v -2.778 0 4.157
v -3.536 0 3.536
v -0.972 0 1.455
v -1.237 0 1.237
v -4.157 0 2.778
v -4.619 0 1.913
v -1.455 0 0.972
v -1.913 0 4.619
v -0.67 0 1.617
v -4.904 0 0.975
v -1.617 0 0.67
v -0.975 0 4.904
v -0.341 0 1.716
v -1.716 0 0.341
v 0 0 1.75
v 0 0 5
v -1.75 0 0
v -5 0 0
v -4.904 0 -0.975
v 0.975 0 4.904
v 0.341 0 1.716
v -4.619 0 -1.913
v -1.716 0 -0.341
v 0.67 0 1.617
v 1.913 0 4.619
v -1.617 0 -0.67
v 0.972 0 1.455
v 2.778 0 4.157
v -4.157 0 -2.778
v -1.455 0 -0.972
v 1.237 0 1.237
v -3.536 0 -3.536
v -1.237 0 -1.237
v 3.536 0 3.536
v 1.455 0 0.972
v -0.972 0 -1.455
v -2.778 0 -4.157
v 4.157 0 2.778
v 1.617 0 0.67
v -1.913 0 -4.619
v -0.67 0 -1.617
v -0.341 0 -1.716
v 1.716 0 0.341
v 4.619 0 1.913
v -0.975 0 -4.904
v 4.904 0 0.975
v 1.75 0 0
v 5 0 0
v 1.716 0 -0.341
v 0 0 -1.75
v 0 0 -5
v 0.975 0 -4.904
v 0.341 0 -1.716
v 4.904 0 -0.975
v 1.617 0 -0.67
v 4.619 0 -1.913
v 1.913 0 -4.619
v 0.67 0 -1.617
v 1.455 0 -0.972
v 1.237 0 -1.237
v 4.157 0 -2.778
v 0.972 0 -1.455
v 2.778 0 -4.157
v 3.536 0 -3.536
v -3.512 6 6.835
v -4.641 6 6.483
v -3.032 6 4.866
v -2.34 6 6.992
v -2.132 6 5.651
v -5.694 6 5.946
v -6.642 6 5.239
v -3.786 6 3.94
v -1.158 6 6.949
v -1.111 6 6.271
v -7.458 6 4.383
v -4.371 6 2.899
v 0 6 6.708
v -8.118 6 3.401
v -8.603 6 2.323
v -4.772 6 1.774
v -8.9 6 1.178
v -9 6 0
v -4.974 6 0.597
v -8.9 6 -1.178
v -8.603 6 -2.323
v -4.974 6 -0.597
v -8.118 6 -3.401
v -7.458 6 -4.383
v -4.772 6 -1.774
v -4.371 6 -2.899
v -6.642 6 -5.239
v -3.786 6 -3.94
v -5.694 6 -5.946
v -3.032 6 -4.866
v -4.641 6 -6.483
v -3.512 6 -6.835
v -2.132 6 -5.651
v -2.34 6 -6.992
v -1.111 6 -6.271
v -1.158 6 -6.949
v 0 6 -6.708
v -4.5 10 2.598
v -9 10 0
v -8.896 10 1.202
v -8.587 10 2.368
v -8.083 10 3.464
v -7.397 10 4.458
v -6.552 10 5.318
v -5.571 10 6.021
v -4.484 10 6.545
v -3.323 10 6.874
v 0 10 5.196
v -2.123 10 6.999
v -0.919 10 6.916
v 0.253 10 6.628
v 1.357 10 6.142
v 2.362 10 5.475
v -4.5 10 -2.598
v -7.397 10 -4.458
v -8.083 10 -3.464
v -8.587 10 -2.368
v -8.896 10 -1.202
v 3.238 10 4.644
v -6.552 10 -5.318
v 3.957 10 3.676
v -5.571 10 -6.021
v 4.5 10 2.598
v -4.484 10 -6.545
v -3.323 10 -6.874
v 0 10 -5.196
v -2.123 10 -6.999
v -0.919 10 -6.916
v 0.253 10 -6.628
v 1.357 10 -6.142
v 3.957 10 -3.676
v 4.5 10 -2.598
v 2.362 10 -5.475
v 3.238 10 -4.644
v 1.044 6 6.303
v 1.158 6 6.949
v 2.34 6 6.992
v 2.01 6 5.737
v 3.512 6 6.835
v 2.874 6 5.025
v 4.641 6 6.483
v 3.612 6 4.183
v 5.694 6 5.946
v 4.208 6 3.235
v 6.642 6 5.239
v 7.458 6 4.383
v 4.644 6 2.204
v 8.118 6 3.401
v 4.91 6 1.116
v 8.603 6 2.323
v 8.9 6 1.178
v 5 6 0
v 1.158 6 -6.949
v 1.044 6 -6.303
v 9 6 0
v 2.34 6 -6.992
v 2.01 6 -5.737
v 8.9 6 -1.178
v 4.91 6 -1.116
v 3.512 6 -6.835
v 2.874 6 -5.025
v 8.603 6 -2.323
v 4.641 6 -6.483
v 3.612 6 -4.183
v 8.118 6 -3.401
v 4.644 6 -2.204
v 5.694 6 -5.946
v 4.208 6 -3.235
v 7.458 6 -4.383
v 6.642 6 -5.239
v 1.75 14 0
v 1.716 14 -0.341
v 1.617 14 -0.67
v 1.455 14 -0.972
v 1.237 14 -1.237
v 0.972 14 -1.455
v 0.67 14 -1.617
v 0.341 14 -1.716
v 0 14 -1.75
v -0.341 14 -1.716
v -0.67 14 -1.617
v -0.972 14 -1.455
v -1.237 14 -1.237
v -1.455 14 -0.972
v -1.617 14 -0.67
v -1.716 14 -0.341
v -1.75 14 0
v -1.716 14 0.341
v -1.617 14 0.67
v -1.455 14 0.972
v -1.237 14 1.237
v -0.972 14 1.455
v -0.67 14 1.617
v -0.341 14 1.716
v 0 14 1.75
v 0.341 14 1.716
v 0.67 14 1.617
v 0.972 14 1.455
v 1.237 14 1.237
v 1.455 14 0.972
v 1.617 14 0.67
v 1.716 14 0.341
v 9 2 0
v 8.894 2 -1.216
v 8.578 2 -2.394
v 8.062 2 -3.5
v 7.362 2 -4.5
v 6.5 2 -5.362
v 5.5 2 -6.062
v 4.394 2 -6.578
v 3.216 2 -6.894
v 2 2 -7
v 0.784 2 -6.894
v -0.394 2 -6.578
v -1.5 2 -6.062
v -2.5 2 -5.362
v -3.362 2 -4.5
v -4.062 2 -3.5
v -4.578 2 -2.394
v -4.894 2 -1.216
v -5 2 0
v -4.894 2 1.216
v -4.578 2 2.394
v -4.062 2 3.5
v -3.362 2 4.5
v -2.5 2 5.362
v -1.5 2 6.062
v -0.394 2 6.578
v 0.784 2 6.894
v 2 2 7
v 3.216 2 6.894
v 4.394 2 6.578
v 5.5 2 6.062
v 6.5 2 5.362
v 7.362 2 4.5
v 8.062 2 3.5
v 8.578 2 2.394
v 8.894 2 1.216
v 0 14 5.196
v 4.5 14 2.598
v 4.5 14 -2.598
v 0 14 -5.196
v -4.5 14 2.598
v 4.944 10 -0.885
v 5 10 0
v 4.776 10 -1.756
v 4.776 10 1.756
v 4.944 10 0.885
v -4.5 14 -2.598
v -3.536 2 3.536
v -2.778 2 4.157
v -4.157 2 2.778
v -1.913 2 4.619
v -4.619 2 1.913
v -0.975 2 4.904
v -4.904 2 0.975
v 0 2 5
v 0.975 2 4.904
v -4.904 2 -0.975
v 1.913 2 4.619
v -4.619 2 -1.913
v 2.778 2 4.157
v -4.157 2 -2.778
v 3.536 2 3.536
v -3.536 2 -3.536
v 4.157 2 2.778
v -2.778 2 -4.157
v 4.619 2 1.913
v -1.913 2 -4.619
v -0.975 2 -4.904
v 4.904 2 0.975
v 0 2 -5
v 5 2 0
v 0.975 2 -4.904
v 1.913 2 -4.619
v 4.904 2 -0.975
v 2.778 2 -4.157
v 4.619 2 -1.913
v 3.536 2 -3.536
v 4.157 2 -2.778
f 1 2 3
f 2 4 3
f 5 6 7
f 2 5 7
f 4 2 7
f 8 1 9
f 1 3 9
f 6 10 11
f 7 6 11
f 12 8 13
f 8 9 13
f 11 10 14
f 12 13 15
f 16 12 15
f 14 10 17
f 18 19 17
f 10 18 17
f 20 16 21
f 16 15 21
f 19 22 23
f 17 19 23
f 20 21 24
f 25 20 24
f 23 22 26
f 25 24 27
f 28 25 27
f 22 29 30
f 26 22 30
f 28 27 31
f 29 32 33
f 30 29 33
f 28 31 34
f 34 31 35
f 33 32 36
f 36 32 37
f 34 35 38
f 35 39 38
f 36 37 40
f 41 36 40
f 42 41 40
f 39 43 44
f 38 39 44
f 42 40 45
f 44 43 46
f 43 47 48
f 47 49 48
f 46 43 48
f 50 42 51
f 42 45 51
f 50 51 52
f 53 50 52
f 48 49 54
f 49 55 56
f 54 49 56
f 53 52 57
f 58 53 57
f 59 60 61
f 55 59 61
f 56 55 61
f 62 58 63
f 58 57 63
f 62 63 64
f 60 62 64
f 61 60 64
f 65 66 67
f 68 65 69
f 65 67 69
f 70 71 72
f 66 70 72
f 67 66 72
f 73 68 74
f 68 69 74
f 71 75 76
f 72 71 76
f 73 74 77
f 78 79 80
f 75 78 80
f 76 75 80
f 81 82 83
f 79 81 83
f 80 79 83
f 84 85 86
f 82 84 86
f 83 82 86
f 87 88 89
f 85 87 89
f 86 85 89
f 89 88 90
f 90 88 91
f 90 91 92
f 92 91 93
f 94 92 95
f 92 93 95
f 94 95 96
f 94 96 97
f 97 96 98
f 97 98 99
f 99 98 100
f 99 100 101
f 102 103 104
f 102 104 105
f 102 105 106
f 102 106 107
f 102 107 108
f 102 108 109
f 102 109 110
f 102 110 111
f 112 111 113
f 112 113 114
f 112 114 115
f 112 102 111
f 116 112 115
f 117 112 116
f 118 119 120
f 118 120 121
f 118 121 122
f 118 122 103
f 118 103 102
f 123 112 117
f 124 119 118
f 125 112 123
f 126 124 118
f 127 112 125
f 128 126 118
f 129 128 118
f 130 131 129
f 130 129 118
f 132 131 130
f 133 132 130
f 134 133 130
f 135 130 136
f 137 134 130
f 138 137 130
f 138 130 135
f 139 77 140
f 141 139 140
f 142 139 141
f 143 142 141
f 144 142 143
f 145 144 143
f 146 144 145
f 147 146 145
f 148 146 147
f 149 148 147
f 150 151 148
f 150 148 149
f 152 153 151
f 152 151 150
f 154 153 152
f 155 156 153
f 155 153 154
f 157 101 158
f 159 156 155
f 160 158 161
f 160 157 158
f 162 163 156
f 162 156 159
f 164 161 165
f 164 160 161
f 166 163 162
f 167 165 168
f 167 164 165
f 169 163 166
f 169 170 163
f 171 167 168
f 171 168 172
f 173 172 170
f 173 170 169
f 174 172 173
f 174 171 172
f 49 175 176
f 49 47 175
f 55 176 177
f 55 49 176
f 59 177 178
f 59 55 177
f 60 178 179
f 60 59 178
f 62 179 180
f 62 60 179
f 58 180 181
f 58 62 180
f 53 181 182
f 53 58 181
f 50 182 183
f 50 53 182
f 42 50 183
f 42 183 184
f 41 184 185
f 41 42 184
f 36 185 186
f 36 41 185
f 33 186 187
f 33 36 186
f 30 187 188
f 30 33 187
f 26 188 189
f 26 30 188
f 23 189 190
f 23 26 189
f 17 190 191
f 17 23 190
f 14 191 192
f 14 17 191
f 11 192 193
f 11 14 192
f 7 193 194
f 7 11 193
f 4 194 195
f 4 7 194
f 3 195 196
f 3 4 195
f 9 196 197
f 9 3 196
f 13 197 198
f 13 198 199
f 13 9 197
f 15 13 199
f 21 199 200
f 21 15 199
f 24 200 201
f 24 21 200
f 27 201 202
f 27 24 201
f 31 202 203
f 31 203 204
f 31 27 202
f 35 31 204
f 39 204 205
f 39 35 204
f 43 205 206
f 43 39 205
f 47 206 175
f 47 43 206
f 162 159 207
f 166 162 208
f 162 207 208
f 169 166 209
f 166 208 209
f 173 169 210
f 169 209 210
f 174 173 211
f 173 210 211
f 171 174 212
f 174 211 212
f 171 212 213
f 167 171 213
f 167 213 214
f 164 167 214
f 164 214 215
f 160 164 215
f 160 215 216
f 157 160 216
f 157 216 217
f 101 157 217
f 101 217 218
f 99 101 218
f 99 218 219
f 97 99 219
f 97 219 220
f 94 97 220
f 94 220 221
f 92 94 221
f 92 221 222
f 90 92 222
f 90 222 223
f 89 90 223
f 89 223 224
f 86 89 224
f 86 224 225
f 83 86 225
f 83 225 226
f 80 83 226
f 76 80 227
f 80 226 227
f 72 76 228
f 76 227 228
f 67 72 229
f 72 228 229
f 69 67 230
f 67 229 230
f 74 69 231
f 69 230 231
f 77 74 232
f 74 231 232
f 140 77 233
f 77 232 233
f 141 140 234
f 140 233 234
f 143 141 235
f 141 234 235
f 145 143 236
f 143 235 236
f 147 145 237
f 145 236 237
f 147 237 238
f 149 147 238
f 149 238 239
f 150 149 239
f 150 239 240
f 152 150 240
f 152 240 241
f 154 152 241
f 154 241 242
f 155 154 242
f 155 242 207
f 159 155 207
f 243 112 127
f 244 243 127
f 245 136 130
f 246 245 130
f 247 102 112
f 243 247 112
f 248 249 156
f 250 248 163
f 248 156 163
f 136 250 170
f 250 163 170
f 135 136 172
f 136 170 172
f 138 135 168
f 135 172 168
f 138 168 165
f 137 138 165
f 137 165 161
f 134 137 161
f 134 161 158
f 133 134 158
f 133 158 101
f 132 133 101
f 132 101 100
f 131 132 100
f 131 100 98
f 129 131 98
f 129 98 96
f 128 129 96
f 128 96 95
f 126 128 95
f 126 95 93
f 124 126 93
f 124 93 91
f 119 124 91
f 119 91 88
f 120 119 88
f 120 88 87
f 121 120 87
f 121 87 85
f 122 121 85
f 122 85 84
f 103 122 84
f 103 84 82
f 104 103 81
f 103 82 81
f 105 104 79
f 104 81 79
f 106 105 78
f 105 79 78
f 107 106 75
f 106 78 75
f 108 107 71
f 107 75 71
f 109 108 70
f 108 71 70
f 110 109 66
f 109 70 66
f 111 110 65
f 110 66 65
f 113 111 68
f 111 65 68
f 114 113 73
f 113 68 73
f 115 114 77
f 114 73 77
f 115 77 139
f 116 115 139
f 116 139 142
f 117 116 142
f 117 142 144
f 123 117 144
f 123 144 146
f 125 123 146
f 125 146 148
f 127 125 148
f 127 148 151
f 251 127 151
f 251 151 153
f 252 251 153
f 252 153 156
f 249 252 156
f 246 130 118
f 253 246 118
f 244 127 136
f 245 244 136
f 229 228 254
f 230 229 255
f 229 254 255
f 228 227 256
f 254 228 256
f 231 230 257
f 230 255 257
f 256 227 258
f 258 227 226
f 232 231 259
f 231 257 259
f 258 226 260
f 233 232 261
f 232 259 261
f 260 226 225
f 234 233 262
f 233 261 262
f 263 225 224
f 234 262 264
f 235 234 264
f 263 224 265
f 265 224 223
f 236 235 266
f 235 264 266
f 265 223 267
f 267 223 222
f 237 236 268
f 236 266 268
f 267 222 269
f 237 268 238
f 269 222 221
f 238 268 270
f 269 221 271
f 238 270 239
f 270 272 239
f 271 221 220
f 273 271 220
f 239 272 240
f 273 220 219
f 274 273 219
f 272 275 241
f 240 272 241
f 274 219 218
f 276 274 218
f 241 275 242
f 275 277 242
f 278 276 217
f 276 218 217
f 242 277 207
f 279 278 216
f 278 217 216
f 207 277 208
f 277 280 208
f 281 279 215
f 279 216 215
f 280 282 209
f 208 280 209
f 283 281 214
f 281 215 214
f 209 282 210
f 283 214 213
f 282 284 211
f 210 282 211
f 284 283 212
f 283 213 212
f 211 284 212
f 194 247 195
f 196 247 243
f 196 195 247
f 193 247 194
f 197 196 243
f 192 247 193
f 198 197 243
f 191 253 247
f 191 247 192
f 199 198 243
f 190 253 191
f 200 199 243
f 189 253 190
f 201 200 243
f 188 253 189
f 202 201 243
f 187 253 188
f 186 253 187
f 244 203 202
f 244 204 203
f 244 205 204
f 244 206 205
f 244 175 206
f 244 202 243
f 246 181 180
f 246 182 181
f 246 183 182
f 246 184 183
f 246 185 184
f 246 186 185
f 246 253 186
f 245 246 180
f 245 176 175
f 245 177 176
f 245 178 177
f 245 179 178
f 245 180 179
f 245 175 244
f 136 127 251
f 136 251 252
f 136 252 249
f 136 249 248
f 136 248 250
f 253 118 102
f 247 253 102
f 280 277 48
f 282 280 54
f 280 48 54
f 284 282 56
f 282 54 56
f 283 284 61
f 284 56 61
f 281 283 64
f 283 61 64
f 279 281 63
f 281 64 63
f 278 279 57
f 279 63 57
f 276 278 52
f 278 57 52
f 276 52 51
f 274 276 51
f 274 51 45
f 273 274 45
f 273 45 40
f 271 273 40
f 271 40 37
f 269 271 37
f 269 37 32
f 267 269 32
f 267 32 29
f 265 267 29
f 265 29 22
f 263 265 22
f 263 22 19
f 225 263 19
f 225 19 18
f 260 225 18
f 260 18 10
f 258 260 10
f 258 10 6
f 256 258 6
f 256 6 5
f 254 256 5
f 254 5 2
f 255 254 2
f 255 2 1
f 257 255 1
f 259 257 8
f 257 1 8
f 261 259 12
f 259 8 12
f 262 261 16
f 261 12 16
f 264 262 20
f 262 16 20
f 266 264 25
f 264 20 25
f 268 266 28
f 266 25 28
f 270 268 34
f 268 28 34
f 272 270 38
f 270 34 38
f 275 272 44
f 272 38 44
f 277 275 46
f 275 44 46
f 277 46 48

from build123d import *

# Parameters (mm, degrees)
SKETCH1_R           = 5
BOSS_EXTRUDE1_DEPTH = 2
SKETCH2_R           = 7
BOSS_EXTRUDE2_DEPTH = 4
SKETCH4_R           = 7
BOSS_EXTRUDE4_DEPTH = 4
SKETCH5_R           = 1.75
CUT_EXTRUDE1_DEPTH  = 11
SKETCH6_R           = 1.75
BOSS_EXTRUDE5_DEPTH = 4


with BuildPart() as part:
    # Sketch1 → Boss-Extrude1 (new body)
    with BuildSketch(Plane(origin=(0, 0, 0), x_dir=(1, 0, 0), z_dir=(0, 1, 0))):
        Circle(SKETCH1_R)
    extrude(amount=BOSS_EXTRUDE1_DEPTH)

    # Sketch2 → Boss-Extrude2 (add)
    with BuildSketch(Plane(origin=(0, 2, 0), x_dir=(1, 0, 0), z_dir=(0, 1, 0))):
        with Locations((2, 0)):
            Circle(SKETCH2_R)
    extrude(amount=BOSS_EXTRUDE2_DEPTH)

    # Sketch4 → Boss-Extrude4 (add)
    with BuildSketch(Plane(origin=(0, 6, 0), x_dir=(1, 0, 0), z_dir=(0, 1, 0))):
        with Locations((-2, 0)):
            Circle(SKETCH4_R)
    extrude(amount=BOSS_EXTRUDE4_DEPTH)

    # Sketch5 → Cut-Extrude1 (cut, through all)
    with BuildSketch(Plane.XZ):
        Circle(SKETCH5_R)
    extrude(amount=-CUT_EXTRUDE1_DEPTH, mode=Mode.SUBTRACT)

    # Sketch6 → Boss-Extrude5 (add)
    with BuildSketch(Plane(origin=(0, 10, 0), x_dir=(1, 0, 0), z_dir=(0, 1, 0))):
        Polygon((-4.5, 2.598076211), (-4.5, -2.598076211), (0, -5.196152423), (4.5, -2.598076211), (4.5, 2.598076211), (0, 5.196152423), align=None)
        Circle(SKETCH6_R, mode=Mode.SUBTRACT)
    extrude(amount=BOSS_EXTRUDE5_DEPTH)


solid = part.part
